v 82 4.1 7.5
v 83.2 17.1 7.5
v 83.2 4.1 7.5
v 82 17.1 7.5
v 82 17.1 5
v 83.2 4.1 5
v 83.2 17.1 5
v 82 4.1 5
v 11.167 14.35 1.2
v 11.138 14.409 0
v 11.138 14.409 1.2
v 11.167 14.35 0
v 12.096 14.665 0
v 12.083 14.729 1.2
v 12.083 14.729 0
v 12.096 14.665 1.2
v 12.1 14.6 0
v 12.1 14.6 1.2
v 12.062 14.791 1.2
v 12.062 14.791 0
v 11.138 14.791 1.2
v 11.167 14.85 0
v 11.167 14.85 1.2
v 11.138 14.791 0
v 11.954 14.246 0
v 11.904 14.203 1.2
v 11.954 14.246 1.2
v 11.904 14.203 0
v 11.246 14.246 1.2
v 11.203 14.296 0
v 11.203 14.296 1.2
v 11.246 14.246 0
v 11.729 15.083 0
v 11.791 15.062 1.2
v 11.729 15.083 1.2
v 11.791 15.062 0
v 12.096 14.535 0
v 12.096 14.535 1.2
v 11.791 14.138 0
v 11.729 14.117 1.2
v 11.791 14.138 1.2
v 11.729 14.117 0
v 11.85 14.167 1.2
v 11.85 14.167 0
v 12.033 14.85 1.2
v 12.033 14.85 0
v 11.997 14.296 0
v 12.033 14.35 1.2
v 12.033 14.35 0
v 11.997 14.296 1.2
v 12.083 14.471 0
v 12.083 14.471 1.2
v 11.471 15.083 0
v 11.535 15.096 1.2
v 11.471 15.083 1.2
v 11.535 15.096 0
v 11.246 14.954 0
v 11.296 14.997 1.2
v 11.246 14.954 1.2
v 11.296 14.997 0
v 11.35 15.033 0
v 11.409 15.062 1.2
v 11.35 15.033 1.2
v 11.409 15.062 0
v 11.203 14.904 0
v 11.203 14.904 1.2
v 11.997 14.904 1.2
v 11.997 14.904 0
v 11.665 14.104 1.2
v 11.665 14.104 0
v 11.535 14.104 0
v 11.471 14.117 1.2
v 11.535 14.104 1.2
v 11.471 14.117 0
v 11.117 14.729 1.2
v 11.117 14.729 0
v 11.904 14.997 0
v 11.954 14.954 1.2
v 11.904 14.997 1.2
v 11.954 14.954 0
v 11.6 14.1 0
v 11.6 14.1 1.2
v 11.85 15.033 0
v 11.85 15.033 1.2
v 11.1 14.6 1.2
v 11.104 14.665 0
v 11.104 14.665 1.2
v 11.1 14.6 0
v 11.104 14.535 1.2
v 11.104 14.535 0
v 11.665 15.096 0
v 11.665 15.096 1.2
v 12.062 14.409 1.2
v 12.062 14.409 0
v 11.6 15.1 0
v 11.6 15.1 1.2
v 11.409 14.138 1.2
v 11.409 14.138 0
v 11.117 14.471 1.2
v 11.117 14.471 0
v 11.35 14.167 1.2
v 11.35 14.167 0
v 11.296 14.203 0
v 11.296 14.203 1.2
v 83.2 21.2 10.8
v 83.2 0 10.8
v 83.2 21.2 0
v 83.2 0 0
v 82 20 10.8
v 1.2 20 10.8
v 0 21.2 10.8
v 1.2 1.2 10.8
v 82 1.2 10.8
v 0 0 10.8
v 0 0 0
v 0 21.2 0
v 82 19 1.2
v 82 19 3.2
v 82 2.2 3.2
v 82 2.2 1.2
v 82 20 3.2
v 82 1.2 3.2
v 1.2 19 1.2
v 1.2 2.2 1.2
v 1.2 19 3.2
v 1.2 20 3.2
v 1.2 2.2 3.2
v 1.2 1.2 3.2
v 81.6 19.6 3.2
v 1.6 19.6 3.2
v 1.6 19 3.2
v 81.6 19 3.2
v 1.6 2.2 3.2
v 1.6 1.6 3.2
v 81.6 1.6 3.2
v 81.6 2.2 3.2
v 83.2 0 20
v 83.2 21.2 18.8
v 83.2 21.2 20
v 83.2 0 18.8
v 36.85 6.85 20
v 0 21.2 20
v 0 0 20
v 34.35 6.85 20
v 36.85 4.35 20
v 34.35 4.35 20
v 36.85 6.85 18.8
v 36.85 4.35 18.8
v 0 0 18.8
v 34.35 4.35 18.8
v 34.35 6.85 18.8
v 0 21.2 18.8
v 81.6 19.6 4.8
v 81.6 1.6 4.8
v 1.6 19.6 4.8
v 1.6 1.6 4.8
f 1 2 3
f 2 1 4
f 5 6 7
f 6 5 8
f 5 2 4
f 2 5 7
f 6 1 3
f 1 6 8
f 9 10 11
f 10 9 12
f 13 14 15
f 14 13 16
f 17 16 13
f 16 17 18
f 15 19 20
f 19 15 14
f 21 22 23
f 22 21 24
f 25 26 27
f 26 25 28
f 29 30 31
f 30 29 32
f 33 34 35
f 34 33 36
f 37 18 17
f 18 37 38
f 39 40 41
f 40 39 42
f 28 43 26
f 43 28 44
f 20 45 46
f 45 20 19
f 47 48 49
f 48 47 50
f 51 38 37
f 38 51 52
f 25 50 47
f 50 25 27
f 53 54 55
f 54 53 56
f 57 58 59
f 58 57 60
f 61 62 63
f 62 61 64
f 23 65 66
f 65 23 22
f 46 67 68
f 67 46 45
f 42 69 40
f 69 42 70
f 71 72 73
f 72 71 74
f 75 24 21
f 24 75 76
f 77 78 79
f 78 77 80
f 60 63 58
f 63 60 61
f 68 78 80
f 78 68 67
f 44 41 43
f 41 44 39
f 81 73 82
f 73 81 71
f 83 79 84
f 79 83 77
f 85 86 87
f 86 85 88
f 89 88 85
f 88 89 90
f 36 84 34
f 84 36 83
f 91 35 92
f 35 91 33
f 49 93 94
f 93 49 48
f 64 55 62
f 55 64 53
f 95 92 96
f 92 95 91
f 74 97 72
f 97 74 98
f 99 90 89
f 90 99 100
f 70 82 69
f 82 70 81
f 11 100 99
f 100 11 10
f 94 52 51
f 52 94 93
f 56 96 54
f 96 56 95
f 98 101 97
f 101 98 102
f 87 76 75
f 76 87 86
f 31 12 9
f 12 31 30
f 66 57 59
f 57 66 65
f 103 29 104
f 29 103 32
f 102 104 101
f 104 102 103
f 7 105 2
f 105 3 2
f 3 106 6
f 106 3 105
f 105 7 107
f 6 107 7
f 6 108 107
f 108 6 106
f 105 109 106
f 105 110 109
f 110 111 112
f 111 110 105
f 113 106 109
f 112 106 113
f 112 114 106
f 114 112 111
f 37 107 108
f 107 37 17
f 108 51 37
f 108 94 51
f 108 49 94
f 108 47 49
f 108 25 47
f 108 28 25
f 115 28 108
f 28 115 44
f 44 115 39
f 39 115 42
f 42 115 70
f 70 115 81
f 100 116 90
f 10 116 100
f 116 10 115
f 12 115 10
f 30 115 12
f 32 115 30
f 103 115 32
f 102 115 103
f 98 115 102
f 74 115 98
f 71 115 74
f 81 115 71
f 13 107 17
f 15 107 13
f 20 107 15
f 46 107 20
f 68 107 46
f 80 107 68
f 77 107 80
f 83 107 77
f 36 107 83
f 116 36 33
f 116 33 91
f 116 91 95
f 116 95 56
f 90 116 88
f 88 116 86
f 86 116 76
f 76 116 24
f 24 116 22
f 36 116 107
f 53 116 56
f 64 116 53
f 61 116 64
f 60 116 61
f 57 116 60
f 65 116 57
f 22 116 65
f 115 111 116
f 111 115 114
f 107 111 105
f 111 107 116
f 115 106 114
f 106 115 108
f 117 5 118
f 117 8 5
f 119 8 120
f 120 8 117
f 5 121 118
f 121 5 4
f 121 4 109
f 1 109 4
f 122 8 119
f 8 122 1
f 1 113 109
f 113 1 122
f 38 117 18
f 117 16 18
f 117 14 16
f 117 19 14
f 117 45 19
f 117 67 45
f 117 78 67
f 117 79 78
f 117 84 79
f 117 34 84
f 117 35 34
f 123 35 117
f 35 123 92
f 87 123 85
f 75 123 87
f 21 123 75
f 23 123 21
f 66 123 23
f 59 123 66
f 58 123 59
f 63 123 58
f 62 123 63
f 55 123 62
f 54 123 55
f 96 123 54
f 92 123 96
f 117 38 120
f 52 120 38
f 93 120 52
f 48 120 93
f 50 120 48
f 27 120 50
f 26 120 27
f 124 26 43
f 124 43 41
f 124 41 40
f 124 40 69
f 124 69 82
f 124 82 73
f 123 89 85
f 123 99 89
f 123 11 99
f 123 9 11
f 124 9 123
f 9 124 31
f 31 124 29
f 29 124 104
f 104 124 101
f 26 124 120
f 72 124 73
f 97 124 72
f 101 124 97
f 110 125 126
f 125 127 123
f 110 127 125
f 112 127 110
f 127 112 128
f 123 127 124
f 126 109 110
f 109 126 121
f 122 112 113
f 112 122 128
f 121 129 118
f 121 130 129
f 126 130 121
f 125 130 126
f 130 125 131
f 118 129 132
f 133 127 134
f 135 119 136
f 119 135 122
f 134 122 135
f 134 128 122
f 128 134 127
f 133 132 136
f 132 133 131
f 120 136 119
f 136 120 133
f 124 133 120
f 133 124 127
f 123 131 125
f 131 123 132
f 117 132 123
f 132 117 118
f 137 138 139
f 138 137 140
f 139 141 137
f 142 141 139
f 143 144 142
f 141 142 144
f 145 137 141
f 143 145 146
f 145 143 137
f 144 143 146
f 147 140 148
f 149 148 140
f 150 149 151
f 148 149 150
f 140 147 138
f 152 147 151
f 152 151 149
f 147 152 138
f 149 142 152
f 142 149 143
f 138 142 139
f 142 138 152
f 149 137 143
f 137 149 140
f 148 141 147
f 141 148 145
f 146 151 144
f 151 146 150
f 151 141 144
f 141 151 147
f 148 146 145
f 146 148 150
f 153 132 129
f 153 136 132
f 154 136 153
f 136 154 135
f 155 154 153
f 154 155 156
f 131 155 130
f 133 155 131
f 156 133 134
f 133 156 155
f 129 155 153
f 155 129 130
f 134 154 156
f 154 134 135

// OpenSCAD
// Parameterized provisional board carriers, not a validated glasses frame.
// Dimensions derive from current review outlines. External battery/camera,
// RF plug, wiring, fasteners, hinge and acoustic interfaces are unresolved.
// openscad -D 'side="main"' -D 'part="tray"' -o main-tray.stl board-carriers.scad
side = "main";              // "main" or "secondary"
part = "assembly";          // "tray", "lid", "assembly"
board_length = side == "main" ? 80 : 100;
board_width = 18;
pcb_thickness = 1.6;         // provisional; actual stack-up not selected
clearance_xy = 0.4;          // per edge; untested fabrication/fit tolerance
// Main now carries flash and support parts underneath. 2mm is a provisional
// component cavity, not the 0.6mm bare-board clearance used on the old PICO study.
bottom_clearance = side == "main" ? 2.0 : 0.6;
top_clearance = side == "main" ? 6 : 12; // provisional external-connector space
wall = 1.2;
floor_thickness = 1.2;
lid_thickness = 1.2;
show_reference_board = true;
exploded_lid_gap = 8;
include_review_openings = true;
mic_floor_port_diameter = 1.0; // provisional passage; final acoustic seal unresolved
led_window = 2.5;             // provisional light passage; diffuser not modeled
ffc_slot_width = 13;          // provisional; confirm mated cable and strain relief
ffc_slot_height = 2.5;

assert(side == "main" || side == "secondary");
assert(board_length > 0 && board_width > 0 && clearance_xy > 0);
assert(wall >= 1 && floor_thickness >= 1 && top_clearance > 0);
inner_l = board_length + 2*clearance_xy;
inner_w = board_width + 2*clearance_xy;
outer_l = inner_l + 2*wall;
outer_w = inner_w + 2*wall;
cavity_h = bottom_clearance + pcb_thickness + top_clearance;
tray_h = floor_thickness + cavity_h;
pcb_z = floor_thickness + bottom_clearance;
// Coordinates below use the implemented PCB origin at its center.
function board_xy(x,y) = [wall+clearance_xy+board_length/2+x,
                          wall+clearance_xy+board_width/2+y];

module tray() {
  difference() {
    cube([outer_l, outer_w, tray_h]);
    translate([wall, wall, floor_thickness])
      cube([inner_l, inner_w, cavity_h + 0.1]);
    if (include_review_openings) {
      // J1 exits the right end on main and left end on secondary. This is an
      // access-volume study; no contact-side or hinge-flex claim is implied.
      translate([side == "main" ? outer_l-wall-0.1 : -0.1,
                 outer_w/2-ffc_slot_width/2,pcb_z+pcb_thickness+0.2])
        cube([wall+0.2,ffc_slot_width,ffc_slot_height]);
      if (side == "main") {
        mic_xy = board_xy(-30,4);
        translate([mic_xy[0],mic_xy[1],-0.1])
          cylinder(d=mic_floor_port_diameter,h=floor_thickness+0.2,$fn=48);
      }
    }
  }
  // Narrow nonconductive ledges. PCB edge/component clearance is unverified.
  for (y = [wall, outer_w-wall-1])
    translate([wall, y, floor_thickness])
      cube([inner_l, 1, bottom_clearance]);
}
module lid() {
  difference() {
    cube([outer_l, outer_w, lid_thickness]);
    if (include_review_openings && side == "main") {
      led_xy = board_xy(-6,-5);
      translate([led_xy[0]-led_window/2,led_xy[1]-led_window/2,-0.1])
        cube([led_window,led_window,lid_thickness+0.2]);
    }
  }
}
module reference_board() {
  // Bounding box only: no missing component bodies are invented.
  color([0.1,0.35,0.2,0.55])
    translate([wall+clearance_xy, wall+clearance_xy, floor_thickness+bottom_clearance])
      cube([board_length,board_width,pcb_thickness]);
}
if (part == "tray") tray();
else if (part == "lid") lid();
else if (part == "assembly") {
  color([0.72,0.78,0.85]) tray();
  if (show_reference_board) reference_board();
  color([0.8,0.84,0.9,0.65]) translate([0,0,tray_h+exploded_lid_gap]) lid();
}
else assert(false,"Unknown part");
echo(side=side, outer_mm=[outer_l,outer_w,tray_h+lid_thickness],
     PCB_mm=[board_length,board_width,pcb_thickness], frame_fit_verified=false);
